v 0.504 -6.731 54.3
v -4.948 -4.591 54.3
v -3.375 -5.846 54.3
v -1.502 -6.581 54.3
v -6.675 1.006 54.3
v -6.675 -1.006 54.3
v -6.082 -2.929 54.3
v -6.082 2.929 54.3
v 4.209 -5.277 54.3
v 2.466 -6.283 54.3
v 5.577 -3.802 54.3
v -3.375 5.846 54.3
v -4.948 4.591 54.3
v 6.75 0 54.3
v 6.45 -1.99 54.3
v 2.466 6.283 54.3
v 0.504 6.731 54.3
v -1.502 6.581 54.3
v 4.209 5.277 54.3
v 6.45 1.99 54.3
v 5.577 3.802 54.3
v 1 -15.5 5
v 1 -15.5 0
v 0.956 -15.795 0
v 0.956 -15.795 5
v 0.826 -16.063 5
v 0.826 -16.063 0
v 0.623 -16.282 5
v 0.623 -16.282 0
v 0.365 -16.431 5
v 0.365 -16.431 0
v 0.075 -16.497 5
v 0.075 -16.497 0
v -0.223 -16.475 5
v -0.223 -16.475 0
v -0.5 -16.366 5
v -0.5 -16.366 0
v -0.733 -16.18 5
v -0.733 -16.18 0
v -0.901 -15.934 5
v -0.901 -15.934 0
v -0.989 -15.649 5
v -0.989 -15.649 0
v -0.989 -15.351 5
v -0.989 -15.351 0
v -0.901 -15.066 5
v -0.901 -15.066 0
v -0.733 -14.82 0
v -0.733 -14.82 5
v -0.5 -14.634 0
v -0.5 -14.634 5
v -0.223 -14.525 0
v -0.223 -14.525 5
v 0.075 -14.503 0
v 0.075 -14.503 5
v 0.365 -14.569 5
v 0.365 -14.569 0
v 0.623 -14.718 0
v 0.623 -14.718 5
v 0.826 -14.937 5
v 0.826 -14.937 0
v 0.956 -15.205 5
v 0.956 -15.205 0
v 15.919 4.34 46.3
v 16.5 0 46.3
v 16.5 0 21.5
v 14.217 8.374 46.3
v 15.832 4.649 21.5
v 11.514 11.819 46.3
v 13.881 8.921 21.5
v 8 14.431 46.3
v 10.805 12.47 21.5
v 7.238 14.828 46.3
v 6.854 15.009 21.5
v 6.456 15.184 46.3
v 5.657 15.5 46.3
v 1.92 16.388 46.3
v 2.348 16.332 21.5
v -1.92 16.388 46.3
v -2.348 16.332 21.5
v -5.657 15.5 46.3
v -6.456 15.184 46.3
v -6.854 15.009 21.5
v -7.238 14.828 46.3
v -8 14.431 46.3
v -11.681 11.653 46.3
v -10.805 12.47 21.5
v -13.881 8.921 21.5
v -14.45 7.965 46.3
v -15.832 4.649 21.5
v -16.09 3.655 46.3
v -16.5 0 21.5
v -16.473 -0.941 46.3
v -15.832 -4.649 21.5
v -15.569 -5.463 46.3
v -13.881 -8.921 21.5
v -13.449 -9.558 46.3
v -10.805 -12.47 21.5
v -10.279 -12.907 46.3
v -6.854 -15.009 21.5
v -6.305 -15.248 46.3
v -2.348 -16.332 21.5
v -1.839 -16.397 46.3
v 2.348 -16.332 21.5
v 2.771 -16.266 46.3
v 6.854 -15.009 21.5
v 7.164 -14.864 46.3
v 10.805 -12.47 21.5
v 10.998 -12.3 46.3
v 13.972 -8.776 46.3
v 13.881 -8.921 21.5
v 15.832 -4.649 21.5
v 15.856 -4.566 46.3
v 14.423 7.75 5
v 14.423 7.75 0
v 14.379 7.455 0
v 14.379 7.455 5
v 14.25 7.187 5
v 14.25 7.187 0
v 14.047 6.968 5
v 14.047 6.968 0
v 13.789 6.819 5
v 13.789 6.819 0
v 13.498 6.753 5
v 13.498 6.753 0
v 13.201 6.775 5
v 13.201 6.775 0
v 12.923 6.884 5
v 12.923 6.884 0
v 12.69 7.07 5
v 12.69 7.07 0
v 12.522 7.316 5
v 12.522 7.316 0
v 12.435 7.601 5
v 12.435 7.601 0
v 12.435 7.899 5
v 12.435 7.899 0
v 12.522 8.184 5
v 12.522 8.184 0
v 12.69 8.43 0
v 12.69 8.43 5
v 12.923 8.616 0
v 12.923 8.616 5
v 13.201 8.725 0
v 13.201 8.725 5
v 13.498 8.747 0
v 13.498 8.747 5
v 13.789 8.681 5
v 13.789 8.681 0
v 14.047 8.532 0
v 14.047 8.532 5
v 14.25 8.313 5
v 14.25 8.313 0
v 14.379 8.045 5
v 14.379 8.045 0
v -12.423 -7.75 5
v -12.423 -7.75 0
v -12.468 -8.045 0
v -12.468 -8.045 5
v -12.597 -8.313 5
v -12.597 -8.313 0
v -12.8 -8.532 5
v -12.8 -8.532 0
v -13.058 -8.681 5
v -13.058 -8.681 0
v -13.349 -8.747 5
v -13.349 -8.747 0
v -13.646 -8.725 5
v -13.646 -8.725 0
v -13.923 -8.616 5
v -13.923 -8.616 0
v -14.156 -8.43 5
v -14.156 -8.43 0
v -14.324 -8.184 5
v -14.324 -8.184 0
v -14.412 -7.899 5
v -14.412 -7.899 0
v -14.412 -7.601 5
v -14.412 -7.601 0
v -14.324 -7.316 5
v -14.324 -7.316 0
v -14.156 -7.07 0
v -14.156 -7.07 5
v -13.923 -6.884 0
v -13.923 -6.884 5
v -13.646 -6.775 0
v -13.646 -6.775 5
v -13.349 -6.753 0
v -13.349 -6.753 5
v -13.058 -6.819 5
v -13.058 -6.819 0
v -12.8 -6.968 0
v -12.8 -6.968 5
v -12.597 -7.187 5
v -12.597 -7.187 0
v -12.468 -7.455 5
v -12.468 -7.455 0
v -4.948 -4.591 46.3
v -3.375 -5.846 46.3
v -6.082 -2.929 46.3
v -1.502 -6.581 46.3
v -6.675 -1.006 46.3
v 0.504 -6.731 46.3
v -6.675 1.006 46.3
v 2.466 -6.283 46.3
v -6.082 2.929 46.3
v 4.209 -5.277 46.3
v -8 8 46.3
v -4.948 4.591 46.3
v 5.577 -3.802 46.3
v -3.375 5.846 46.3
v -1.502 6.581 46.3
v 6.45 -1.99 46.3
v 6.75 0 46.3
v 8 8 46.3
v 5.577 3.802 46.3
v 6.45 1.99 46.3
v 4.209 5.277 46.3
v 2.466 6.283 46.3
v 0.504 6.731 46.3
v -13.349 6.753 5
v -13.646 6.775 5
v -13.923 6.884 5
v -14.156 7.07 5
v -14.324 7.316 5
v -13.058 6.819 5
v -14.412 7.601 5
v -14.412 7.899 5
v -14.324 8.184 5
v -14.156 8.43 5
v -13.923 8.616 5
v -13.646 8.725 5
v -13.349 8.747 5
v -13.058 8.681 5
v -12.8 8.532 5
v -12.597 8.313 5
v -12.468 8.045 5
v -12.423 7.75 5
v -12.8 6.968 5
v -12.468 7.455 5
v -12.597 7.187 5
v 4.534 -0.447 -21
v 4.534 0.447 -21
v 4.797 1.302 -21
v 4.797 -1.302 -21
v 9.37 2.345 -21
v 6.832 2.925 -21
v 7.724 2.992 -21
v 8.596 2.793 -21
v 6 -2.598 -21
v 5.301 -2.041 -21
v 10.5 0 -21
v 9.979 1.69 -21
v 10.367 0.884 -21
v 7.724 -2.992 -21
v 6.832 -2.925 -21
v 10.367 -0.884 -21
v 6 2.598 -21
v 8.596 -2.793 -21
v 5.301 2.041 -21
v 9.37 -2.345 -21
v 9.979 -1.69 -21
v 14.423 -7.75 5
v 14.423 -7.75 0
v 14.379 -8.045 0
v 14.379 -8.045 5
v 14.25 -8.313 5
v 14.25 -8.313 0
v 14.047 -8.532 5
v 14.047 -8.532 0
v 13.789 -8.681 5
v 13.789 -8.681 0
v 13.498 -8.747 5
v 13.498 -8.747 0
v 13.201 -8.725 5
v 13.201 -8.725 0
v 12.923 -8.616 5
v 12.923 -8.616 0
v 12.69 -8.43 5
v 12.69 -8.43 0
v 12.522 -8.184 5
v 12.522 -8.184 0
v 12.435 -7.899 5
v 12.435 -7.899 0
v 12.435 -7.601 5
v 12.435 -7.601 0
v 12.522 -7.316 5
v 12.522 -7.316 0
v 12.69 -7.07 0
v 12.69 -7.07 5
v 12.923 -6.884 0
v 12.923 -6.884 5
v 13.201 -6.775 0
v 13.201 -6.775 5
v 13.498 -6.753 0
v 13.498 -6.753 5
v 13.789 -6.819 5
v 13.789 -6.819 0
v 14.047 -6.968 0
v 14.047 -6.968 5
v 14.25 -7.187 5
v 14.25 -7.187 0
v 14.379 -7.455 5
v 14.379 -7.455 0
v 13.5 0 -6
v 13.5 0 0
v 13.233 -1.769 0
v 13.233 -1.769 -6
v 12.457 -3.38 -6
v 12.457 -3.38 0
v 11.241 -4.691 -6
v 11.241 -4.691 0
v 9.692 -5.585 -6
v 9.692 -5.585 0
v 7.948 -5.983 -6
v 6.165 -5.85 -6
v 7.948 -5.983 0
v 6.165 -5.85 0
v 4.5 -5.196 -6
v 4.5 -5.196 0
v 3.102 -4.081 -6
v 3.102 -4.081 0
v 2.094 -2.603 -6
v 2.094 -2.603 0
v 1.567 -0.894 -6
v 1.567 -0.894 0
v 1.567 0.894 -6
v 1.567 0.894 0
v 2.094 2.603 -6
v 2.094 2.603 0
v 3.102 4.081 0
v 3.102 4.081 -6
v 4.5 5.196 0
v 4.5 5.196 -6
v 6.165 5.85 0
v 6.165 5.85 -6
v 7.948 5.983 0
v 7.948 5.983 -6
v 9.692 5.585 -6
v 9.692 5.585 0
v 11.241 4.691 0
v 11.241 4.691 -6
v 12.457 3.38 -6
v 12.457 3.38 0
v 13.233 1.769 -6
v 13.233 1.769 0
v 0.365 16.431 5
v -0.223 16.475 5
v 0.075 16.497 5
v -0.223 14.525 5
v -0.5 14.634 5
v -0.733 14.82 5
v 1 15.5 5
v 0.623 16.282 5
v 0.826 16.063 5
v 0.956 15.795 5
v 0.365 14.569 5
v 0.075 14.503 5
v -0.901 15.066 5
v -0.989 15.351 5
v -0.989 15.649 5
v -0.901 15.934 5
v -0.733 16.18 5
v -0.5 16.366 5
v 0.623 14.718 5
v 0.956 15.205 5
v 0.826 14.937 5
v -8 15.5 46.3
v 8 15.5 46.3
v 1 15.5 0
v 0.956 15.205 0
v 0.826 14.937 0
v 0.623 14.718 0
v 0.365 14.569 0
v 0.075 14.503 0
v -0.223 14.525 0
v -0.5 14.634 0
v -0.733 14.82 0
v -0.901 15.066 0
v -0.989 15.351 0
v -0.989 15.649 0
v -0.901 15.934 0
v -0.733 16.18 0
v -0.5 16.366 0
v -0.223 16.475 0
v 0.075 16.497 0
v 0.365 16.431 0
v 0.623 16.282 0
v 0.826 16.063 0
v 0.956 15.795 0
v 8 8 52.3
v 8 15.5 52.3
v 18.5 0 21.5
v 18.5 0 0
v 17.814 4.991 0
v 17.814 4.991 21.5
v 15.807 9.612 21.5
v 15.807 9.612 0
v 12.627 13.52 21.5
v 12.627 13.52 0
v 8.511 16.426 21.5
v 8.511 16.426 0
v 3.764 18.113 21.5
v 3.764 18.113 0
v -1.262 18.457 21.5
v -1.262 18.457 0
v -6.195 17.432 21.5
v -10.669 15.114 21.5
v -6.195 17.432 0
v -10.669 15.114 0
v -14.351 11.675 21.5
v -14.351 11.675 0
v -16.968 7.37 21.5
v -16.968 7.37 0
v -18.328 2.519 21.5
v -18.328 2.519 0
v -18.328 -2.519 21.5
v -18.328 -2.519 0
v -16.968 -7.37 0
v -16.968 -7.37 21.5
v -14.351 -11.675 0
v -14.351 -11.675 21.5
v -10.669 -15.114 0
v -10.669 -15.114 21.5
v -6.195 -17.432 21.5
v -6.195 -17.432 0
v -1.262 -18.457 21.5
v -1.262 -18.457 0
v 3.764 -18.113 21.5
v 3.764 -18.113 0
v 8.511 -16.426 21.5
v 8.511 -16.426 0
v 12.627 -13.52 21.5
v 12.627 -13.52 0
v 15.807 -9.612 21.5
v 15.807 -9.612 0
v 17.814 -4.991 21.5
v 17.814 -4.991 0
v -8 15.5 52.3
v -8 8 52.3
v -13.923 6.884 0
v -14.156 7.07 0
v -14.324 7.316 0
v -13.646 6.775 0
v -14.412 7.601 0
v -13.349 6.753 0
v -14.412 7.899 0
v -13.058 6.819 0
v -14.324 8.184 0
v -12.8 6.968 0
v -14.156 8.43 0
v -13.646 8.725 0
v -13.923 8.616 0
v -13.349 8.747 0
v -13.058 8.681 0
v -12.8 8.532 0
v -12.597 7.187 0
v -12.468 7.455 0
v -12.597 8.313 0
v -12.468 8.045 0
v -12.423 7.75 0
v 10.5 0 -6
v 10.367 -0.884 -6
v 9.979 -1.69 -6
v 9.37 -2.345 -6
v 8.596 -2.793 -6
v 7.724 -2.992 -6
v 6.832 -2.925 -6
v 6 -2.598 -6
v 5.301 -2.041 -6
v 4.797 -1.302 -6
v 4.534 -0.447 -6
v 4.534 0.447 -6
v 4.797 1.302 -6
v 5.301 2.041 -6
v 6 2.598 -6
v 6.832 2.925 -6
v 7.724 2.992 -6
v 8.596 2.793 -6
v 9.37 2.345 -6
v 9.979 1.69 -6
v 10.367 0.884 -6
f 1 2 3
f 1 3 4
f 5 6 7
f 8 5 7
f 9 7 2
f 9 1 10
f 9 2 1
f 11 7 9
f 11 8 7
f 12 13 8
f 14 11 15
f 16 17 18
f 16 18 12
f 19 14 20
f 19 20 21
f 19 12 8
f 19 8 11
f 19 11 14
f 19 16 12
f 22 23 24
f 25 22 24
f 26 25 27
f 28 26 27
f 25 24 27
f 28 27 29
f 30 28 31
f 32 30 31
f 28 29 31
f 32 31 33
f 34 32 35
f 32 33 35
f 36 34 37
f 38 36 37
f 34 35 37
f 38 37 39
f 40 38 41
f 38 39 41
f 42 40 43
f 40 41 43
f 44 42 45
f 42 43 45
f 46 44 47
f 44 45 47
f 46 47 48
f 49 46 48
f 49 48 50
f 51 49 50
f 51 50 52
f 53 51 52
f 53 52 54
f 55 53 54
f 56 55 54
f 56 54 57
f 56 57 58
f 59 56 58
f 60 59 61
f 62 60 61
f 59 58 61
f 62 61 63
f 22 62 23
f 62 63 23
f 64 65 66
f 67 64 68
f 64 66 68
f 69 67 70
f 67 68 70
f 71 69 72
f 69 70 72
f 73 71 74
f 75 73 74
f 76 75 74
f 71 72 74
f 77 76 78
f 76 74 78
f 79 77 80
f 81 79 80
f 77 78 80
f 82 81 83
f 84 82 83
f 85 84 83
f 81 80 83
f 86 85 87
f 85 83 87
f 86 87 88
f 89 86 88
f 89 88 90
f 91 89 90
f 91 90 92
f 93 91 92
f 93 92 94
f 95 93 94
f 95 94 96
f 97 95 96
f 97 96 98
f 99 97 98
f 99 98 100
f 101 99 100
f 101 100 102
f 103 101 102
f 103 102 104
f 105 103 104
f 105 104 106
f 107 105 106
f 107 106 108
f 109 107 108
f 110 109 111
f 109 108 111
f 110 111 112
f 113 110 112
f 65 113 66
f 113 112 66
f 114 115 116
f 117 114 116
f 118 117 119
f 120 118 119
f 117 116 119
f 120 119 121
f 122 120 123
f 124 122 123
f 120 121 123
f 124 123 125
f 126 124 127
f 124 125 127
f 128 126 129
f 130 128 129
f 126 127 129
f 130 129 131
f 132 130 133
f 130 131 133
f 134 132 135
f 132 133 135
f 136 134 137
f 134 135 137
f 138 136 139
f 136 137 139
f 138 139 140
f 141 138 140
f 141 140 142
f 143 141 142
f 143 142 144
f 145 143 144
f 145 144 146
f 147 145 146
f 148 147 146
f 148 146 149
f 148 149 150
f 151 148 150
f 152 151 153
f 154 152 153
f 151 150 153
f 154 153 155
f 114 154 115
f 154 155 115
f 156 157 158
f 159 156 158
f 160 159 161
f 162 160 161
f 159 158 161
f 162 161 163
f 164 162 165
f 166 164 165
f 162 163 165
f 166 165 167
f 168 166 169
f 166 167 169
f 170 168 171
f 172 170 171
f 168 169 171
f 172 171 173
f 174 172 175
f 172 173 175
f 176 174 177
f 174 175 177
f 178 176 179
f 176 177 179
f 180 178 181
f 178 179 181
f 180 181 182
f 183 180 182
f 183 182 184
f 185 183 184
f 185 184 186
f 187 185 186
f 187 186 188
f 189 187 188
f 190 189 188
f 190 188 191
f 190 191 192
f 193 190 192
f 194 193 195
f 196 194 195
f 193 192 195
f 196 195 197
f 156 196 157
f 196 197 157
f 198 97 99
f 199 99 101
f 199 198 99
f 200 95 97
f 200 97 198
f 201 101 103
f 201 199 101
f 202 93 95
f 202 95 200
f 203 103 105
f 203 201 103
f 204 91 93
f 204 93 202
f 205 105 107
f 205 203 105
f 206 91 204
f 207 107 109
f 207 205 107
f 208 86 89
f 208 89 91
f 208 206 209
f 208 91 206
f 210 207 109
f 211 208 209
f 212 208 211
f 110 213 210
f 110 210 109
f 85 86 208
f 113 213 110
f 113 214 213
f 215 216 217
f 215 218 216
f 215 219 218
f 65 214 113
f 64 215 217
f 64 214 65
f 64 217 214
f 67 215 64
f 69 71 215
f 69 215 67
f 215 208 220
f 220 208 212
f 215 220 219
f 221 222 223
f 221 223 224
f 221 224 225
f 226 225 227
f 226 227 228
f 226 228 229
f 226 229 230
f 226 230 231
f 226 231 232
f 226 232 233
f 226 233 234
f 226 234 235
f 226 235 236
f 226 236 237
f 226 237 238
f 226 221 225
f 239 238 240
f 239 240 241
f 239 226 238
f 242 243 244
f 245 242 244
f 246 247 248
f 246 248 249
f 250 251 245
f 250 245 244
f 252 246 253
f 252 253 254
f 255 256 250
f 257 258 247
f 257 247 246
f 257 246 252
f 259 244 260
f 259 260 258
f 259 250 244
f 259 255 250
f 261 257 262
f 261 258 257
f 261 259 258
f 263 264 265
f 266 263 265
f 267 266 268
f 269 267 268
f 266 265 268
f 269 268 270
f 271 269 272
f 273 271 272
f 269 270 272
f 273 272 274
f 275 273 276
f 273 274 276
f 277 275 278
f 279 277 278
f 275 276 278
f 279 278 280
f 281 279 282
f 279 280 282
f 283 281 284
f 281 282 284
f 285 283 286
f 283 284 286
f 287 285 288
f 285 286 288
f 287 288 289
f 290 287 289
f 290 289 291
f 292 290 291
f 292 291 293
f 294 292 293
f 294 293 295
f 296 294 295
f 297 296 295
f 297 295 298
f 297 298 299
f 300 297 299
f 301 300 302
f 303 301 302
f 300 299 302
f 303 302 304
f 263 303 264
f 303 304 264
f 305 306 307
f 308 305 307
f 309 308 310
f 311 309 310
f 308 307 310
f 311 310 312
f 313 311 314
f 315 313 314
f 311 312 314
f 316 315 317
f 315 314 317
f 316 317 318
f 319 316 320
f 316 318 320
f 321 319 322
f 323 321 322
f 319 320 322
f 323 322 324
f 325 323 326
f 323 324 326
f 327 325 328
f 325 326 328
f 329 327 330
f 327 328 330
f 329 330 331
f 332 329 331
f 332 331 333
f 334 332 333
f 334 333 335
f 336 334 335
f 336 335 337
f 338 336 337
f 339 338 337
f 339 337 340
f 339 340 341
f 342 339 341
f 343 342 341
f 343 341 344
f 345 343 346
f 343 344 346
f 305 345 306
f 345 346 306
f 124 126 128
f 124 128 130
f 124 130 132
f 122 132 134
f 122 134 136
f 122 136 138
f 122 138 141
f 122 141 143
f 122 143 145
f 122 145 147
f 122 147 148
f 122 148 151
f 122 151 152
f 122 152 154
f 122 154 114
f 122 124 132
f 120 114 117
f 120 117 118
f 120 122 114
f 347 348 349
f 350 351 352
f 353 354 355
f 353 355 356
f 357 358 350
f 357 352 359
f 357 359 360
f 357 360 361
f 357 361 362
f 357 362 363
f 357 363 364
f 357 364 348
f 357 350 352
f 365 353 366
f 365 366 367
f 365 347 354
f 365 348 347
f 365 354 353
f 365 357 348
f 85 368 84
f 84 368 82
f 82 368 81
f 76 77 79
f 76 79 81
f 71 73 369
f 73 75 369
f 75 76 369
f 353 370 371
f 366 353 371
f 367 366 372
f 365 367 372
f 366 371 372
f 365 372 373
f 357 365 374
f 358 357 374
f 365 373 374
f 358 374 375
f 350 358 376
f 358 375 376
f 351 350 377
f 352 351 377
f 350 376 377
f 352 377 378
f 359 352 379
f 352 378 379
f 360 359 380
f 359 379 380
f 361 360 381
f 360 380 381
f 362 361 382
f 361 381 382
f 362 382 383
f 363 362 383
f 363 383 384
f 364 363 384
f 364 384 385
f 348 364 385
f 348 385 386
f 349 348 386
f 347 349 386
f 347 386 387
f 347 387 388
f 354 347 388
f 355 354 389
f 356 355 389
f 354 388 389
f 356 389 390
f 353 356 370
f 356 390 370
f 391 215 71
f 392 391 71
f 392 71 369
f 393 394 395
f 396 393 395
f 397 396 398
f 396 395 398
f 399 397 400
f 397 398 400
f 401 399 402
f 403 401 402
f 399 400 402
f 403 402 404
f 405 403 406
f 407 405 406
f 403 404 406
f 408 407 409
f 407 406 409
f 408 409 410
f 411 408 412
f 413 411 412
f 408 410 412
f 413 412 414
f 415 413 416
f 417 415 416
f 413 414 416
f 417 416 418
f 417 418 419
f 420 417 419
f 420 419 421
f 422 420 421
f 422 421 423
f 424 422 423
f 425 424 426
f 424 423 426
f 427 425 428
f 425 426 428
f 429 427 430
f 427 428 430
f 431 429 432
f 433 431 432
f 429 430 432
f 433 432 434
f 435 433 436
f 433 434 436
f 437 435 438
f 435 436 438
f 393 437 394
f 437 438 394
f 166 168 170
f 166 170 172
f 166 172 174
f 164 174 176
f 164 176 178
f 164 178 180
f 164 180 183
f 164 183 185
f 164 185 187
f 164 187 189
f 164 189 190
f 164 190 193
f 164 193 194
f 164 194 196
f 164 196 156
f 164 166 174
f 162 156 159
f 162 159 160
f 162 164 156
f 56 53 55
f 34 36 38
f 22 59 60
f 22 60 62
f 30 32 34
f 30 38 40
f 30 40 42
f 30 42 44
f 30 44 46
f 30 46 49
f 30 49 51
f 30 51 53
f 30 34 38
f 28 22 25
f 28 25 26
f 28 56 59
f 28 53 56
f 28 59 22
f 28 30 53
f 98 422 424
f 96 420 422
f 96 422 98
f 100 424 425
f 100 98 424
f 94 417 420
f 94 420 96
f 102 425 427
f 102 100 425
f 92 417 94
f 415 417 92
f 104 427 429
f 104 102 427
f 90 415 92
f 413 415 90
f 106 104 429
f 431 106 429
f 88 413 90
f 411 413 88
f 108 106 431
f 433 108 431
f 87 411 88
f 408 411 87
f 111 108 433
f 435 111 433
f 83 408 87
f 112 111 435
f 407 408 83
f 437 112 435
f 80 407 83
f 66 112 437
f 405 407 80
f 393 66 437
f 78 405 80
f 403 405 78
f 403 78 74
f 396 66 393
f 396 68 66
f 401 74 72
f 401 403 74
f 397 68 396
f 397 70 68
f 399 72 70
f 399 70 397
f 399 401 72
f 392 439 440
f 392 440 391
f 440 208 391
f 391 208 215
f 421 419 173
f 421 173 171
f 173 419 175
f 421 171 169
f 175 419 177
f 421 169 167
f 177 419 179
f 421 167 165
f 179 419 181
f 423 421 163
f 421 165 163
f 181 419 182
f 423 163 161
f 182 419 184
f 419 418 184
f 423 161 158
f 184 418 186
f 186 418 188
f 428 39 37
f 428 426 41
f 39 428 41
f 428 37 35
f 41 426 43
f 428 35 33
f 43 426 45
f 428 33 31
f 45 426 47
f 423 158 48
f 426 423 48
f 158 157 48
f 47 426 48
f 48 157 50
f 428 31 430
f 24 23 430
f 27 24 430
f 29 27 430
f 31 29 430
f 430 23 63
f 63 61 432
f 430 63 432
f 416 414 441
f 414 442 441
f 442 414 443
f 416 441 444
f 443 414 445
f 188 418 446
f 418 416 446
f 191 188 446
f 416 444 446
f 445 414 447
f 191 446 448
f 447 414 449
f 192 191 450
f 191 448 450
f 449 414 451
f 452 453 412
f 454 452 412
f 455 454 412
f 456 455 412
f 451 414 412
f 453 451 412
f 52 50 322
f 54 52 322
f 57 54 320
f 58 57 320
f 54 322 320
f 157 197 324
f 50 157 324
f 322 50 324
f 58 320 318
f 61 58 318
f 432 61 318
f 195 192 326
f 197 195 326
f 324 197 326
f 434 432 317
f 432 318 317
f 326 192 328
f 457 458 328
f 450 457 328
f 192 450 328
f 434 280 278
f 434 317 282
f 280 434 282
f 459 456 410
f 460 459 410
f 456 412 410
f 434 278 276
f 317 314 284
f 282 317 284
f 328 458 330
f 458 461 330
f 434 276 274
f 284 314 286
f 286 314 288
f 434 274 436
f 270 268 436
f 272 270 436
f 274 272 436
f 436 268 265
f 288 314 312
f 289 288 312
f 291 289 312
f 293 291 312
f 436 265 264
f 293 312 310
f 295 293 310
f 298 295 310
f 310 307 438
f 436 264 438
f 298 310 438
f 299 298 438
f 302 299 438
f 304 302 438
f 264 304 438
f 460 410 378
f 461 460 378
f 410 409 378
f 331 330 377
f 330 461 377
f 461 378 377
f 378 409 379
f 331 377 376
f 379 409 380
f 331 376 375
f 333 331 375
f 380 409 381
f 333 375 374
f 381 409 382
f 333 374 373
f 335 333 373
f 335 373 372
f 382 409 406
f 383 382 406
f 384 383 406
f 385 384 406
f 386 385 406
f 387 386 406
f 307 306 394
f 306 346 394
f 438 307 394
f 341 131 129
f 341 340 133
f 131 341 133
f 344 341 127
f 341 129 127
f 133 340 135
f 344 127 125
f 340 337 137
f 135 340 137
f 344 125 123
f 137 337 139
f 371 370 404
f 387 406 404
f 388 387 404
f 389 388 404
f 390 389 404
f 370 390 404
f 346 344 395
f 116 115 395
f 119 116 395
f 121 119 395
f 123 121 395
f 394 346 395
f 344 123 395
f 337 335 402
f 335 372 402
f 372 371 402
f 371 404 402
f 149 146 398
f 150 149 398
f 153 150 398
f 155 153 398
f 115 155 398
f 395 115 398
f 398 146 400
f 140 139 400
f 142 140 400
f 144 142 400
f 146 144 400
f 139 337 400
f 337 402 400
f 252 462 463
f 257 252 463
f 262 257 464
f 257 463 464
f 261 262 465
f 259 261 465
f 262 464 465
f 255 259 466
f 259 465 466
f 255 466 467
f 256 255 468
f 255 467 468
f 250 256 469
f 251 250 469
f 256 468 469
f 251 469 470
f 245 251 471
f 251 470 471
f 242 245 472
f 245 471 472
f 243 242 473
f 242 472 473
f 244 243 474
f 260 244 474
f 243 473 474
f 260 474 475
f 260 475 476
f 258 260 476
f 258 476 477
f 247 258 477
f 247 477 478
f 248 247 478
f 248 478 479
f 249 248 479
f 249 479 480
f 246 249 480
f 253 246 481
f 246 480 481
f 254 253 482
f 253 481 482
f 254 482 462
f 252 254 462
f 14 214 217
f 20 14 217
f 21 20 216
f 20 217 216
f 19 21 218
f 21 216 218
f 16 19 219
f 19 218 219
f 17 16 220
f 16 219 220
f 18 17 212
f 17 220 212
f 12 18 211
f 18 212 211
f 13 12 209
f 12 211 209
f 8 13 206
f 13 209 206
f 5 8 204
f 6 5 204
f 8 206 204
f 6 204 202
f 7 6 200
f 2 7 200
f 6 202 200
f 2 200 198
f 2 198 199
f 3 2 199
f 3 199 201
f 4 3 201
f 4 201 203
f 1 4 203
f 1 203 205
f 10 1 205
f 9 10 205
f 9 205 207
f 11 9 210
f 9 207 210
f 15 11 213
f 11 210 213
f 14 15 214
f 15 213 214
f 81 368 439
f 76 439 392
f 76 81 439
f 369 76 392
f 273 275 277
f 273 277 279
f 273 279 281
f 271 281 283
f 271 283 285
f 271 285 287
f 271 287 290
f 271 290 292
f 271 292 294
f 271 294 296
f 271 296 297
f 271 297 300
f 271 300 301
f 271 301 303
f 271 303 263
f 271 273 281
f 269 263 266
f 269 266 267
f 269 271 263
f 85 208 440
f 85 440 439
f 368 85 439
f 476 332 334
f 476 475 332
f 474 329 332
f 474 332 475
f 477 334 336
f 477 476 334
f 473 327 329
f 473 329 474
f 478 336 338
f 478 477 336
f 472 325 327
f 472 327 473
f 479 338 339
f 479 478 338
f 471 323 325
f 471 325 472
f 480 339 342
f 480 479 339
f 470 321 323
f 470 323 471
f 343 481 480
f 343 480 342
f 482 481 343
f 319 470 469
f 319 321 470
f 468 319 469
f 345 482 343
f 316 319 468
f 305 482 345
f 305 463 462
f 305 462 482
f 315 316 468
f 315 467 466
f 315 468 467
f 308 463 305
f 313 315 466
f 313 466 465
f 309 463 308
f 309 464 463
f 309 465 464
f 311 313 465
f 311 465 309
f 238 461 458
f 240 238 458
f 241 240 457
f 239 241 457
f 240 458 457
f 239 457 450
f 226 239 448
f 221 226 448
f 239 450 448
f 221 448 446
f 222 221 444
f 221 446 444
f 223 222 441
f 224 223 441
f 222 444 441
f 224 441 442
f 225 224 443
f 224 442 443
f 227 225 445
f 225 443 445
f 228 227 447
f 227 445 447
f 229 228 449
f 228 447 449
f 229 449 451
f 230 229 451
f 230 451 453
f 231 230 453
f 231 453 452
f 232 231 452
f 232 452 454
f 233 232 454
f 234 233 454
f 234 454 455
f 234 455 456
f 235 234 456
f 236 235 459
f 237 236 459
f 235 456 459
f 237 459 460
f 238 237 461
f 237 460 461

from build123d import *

# Parameters (mm, degrees)
SKETCH_R     = 18.5
PAD_DEPTH    = 21.5
SKETCH001_R  = 6
PAD001_DEPTH = 6
SKETCH002_R  = 3
PAD002_DEPTH = 15
SKETCH003_R  = 1
POCKET_DEPTH = 5
SKETCH004_R  = 16.5
PAD003_DEPTH = 24.8
SKETCH005_W  = 16
SKETCH005_H  = 7.5
PAD004_DEPTH = 6
SKETCH006_R  = 6.75
PAD005_DEPTH = 8


with BuildPart() as part:
    # Sketch → Pad (new body)
    with BuildSketch(Plane.XY):
        Circle(SKETCH_R)
    extrude(amount=PAD_DEPTH)

    # Sketch001 (on Face2 of Pad) → Pad001 (join)
    with BuildSketch(Plane(origin=(0, 0, 0), x_dir=(1, 0, 0), z_dir=(0, 0, -1))):
        with Locations((7.5, 0)):
            Circle(SKETCH001_R)
    extrude(amount=PAD001_DEPTH)

    # Sketch002 (on Face5 of Pad001) → Pad002 (join)
    with BuildSketch(Plane(origin=(0, 0, -6), x_dir=(1, 0, 0), z_dir=(0, 0, -1))):
        with Locations((7.5, 0)):
            Circle(SKETCH002_R)
    extrude(amount=PAD002_DEPTH)

    # Sketch003 (on Face2 of Pad002) → Pocket (cut)
    with BuildSketch(Plane(origin=(0, 0, 0), x_dir=(1, 0, 0), z_dir=(0, 0, -1))):
        with Locations((0, 15.5)):
            Circle(SKETCH003_R)
        with Locations((13.423394, 7.75)):
            Circle(SKETCH003_R)
        with Locations((13.423394, -7.75)):
            Circle(SKETCH003_R)
        with Locations((0, -15.5)):
            Circle(SKETCH003_R)
        with Locations((-13.423394, -7.75)):
            Circle(SKETCH003_R)
        with Locations((-13.423394, 7.75)):
            Circle(SKETCH003_R)
    extrude(amount=-POCKET_DEPTH, mode=Mode.SUBTRACT)

    # Sketch004 (on Face3 of Pocket) → Pad003 (join)
    with BuildSketch(Plane.XY.offset(21.5)):
        Circle(SKETCH004_R)
    extrude(amount=PAD003_DEPTH)

    # Sketch005 (on Face19 of Pad003) → Pad004 (join)
    with BuildSketch(Plane.XY.offset(46.3)):
        with Locations((0, 11.75)):
            Rectangle(SKETCH005_W, SKETCH005_H)
    extrude(amount=PAD004_DEPTH)

    # Sketch006 (on Face19 of Pad004) → Pad005 (join)
    with BuildSketch(Plane.XY.offset(46.3)):
        Circle(SKETCH006_R)
    extrude(amount=PAD005_DEPTH)


solid = part.part
